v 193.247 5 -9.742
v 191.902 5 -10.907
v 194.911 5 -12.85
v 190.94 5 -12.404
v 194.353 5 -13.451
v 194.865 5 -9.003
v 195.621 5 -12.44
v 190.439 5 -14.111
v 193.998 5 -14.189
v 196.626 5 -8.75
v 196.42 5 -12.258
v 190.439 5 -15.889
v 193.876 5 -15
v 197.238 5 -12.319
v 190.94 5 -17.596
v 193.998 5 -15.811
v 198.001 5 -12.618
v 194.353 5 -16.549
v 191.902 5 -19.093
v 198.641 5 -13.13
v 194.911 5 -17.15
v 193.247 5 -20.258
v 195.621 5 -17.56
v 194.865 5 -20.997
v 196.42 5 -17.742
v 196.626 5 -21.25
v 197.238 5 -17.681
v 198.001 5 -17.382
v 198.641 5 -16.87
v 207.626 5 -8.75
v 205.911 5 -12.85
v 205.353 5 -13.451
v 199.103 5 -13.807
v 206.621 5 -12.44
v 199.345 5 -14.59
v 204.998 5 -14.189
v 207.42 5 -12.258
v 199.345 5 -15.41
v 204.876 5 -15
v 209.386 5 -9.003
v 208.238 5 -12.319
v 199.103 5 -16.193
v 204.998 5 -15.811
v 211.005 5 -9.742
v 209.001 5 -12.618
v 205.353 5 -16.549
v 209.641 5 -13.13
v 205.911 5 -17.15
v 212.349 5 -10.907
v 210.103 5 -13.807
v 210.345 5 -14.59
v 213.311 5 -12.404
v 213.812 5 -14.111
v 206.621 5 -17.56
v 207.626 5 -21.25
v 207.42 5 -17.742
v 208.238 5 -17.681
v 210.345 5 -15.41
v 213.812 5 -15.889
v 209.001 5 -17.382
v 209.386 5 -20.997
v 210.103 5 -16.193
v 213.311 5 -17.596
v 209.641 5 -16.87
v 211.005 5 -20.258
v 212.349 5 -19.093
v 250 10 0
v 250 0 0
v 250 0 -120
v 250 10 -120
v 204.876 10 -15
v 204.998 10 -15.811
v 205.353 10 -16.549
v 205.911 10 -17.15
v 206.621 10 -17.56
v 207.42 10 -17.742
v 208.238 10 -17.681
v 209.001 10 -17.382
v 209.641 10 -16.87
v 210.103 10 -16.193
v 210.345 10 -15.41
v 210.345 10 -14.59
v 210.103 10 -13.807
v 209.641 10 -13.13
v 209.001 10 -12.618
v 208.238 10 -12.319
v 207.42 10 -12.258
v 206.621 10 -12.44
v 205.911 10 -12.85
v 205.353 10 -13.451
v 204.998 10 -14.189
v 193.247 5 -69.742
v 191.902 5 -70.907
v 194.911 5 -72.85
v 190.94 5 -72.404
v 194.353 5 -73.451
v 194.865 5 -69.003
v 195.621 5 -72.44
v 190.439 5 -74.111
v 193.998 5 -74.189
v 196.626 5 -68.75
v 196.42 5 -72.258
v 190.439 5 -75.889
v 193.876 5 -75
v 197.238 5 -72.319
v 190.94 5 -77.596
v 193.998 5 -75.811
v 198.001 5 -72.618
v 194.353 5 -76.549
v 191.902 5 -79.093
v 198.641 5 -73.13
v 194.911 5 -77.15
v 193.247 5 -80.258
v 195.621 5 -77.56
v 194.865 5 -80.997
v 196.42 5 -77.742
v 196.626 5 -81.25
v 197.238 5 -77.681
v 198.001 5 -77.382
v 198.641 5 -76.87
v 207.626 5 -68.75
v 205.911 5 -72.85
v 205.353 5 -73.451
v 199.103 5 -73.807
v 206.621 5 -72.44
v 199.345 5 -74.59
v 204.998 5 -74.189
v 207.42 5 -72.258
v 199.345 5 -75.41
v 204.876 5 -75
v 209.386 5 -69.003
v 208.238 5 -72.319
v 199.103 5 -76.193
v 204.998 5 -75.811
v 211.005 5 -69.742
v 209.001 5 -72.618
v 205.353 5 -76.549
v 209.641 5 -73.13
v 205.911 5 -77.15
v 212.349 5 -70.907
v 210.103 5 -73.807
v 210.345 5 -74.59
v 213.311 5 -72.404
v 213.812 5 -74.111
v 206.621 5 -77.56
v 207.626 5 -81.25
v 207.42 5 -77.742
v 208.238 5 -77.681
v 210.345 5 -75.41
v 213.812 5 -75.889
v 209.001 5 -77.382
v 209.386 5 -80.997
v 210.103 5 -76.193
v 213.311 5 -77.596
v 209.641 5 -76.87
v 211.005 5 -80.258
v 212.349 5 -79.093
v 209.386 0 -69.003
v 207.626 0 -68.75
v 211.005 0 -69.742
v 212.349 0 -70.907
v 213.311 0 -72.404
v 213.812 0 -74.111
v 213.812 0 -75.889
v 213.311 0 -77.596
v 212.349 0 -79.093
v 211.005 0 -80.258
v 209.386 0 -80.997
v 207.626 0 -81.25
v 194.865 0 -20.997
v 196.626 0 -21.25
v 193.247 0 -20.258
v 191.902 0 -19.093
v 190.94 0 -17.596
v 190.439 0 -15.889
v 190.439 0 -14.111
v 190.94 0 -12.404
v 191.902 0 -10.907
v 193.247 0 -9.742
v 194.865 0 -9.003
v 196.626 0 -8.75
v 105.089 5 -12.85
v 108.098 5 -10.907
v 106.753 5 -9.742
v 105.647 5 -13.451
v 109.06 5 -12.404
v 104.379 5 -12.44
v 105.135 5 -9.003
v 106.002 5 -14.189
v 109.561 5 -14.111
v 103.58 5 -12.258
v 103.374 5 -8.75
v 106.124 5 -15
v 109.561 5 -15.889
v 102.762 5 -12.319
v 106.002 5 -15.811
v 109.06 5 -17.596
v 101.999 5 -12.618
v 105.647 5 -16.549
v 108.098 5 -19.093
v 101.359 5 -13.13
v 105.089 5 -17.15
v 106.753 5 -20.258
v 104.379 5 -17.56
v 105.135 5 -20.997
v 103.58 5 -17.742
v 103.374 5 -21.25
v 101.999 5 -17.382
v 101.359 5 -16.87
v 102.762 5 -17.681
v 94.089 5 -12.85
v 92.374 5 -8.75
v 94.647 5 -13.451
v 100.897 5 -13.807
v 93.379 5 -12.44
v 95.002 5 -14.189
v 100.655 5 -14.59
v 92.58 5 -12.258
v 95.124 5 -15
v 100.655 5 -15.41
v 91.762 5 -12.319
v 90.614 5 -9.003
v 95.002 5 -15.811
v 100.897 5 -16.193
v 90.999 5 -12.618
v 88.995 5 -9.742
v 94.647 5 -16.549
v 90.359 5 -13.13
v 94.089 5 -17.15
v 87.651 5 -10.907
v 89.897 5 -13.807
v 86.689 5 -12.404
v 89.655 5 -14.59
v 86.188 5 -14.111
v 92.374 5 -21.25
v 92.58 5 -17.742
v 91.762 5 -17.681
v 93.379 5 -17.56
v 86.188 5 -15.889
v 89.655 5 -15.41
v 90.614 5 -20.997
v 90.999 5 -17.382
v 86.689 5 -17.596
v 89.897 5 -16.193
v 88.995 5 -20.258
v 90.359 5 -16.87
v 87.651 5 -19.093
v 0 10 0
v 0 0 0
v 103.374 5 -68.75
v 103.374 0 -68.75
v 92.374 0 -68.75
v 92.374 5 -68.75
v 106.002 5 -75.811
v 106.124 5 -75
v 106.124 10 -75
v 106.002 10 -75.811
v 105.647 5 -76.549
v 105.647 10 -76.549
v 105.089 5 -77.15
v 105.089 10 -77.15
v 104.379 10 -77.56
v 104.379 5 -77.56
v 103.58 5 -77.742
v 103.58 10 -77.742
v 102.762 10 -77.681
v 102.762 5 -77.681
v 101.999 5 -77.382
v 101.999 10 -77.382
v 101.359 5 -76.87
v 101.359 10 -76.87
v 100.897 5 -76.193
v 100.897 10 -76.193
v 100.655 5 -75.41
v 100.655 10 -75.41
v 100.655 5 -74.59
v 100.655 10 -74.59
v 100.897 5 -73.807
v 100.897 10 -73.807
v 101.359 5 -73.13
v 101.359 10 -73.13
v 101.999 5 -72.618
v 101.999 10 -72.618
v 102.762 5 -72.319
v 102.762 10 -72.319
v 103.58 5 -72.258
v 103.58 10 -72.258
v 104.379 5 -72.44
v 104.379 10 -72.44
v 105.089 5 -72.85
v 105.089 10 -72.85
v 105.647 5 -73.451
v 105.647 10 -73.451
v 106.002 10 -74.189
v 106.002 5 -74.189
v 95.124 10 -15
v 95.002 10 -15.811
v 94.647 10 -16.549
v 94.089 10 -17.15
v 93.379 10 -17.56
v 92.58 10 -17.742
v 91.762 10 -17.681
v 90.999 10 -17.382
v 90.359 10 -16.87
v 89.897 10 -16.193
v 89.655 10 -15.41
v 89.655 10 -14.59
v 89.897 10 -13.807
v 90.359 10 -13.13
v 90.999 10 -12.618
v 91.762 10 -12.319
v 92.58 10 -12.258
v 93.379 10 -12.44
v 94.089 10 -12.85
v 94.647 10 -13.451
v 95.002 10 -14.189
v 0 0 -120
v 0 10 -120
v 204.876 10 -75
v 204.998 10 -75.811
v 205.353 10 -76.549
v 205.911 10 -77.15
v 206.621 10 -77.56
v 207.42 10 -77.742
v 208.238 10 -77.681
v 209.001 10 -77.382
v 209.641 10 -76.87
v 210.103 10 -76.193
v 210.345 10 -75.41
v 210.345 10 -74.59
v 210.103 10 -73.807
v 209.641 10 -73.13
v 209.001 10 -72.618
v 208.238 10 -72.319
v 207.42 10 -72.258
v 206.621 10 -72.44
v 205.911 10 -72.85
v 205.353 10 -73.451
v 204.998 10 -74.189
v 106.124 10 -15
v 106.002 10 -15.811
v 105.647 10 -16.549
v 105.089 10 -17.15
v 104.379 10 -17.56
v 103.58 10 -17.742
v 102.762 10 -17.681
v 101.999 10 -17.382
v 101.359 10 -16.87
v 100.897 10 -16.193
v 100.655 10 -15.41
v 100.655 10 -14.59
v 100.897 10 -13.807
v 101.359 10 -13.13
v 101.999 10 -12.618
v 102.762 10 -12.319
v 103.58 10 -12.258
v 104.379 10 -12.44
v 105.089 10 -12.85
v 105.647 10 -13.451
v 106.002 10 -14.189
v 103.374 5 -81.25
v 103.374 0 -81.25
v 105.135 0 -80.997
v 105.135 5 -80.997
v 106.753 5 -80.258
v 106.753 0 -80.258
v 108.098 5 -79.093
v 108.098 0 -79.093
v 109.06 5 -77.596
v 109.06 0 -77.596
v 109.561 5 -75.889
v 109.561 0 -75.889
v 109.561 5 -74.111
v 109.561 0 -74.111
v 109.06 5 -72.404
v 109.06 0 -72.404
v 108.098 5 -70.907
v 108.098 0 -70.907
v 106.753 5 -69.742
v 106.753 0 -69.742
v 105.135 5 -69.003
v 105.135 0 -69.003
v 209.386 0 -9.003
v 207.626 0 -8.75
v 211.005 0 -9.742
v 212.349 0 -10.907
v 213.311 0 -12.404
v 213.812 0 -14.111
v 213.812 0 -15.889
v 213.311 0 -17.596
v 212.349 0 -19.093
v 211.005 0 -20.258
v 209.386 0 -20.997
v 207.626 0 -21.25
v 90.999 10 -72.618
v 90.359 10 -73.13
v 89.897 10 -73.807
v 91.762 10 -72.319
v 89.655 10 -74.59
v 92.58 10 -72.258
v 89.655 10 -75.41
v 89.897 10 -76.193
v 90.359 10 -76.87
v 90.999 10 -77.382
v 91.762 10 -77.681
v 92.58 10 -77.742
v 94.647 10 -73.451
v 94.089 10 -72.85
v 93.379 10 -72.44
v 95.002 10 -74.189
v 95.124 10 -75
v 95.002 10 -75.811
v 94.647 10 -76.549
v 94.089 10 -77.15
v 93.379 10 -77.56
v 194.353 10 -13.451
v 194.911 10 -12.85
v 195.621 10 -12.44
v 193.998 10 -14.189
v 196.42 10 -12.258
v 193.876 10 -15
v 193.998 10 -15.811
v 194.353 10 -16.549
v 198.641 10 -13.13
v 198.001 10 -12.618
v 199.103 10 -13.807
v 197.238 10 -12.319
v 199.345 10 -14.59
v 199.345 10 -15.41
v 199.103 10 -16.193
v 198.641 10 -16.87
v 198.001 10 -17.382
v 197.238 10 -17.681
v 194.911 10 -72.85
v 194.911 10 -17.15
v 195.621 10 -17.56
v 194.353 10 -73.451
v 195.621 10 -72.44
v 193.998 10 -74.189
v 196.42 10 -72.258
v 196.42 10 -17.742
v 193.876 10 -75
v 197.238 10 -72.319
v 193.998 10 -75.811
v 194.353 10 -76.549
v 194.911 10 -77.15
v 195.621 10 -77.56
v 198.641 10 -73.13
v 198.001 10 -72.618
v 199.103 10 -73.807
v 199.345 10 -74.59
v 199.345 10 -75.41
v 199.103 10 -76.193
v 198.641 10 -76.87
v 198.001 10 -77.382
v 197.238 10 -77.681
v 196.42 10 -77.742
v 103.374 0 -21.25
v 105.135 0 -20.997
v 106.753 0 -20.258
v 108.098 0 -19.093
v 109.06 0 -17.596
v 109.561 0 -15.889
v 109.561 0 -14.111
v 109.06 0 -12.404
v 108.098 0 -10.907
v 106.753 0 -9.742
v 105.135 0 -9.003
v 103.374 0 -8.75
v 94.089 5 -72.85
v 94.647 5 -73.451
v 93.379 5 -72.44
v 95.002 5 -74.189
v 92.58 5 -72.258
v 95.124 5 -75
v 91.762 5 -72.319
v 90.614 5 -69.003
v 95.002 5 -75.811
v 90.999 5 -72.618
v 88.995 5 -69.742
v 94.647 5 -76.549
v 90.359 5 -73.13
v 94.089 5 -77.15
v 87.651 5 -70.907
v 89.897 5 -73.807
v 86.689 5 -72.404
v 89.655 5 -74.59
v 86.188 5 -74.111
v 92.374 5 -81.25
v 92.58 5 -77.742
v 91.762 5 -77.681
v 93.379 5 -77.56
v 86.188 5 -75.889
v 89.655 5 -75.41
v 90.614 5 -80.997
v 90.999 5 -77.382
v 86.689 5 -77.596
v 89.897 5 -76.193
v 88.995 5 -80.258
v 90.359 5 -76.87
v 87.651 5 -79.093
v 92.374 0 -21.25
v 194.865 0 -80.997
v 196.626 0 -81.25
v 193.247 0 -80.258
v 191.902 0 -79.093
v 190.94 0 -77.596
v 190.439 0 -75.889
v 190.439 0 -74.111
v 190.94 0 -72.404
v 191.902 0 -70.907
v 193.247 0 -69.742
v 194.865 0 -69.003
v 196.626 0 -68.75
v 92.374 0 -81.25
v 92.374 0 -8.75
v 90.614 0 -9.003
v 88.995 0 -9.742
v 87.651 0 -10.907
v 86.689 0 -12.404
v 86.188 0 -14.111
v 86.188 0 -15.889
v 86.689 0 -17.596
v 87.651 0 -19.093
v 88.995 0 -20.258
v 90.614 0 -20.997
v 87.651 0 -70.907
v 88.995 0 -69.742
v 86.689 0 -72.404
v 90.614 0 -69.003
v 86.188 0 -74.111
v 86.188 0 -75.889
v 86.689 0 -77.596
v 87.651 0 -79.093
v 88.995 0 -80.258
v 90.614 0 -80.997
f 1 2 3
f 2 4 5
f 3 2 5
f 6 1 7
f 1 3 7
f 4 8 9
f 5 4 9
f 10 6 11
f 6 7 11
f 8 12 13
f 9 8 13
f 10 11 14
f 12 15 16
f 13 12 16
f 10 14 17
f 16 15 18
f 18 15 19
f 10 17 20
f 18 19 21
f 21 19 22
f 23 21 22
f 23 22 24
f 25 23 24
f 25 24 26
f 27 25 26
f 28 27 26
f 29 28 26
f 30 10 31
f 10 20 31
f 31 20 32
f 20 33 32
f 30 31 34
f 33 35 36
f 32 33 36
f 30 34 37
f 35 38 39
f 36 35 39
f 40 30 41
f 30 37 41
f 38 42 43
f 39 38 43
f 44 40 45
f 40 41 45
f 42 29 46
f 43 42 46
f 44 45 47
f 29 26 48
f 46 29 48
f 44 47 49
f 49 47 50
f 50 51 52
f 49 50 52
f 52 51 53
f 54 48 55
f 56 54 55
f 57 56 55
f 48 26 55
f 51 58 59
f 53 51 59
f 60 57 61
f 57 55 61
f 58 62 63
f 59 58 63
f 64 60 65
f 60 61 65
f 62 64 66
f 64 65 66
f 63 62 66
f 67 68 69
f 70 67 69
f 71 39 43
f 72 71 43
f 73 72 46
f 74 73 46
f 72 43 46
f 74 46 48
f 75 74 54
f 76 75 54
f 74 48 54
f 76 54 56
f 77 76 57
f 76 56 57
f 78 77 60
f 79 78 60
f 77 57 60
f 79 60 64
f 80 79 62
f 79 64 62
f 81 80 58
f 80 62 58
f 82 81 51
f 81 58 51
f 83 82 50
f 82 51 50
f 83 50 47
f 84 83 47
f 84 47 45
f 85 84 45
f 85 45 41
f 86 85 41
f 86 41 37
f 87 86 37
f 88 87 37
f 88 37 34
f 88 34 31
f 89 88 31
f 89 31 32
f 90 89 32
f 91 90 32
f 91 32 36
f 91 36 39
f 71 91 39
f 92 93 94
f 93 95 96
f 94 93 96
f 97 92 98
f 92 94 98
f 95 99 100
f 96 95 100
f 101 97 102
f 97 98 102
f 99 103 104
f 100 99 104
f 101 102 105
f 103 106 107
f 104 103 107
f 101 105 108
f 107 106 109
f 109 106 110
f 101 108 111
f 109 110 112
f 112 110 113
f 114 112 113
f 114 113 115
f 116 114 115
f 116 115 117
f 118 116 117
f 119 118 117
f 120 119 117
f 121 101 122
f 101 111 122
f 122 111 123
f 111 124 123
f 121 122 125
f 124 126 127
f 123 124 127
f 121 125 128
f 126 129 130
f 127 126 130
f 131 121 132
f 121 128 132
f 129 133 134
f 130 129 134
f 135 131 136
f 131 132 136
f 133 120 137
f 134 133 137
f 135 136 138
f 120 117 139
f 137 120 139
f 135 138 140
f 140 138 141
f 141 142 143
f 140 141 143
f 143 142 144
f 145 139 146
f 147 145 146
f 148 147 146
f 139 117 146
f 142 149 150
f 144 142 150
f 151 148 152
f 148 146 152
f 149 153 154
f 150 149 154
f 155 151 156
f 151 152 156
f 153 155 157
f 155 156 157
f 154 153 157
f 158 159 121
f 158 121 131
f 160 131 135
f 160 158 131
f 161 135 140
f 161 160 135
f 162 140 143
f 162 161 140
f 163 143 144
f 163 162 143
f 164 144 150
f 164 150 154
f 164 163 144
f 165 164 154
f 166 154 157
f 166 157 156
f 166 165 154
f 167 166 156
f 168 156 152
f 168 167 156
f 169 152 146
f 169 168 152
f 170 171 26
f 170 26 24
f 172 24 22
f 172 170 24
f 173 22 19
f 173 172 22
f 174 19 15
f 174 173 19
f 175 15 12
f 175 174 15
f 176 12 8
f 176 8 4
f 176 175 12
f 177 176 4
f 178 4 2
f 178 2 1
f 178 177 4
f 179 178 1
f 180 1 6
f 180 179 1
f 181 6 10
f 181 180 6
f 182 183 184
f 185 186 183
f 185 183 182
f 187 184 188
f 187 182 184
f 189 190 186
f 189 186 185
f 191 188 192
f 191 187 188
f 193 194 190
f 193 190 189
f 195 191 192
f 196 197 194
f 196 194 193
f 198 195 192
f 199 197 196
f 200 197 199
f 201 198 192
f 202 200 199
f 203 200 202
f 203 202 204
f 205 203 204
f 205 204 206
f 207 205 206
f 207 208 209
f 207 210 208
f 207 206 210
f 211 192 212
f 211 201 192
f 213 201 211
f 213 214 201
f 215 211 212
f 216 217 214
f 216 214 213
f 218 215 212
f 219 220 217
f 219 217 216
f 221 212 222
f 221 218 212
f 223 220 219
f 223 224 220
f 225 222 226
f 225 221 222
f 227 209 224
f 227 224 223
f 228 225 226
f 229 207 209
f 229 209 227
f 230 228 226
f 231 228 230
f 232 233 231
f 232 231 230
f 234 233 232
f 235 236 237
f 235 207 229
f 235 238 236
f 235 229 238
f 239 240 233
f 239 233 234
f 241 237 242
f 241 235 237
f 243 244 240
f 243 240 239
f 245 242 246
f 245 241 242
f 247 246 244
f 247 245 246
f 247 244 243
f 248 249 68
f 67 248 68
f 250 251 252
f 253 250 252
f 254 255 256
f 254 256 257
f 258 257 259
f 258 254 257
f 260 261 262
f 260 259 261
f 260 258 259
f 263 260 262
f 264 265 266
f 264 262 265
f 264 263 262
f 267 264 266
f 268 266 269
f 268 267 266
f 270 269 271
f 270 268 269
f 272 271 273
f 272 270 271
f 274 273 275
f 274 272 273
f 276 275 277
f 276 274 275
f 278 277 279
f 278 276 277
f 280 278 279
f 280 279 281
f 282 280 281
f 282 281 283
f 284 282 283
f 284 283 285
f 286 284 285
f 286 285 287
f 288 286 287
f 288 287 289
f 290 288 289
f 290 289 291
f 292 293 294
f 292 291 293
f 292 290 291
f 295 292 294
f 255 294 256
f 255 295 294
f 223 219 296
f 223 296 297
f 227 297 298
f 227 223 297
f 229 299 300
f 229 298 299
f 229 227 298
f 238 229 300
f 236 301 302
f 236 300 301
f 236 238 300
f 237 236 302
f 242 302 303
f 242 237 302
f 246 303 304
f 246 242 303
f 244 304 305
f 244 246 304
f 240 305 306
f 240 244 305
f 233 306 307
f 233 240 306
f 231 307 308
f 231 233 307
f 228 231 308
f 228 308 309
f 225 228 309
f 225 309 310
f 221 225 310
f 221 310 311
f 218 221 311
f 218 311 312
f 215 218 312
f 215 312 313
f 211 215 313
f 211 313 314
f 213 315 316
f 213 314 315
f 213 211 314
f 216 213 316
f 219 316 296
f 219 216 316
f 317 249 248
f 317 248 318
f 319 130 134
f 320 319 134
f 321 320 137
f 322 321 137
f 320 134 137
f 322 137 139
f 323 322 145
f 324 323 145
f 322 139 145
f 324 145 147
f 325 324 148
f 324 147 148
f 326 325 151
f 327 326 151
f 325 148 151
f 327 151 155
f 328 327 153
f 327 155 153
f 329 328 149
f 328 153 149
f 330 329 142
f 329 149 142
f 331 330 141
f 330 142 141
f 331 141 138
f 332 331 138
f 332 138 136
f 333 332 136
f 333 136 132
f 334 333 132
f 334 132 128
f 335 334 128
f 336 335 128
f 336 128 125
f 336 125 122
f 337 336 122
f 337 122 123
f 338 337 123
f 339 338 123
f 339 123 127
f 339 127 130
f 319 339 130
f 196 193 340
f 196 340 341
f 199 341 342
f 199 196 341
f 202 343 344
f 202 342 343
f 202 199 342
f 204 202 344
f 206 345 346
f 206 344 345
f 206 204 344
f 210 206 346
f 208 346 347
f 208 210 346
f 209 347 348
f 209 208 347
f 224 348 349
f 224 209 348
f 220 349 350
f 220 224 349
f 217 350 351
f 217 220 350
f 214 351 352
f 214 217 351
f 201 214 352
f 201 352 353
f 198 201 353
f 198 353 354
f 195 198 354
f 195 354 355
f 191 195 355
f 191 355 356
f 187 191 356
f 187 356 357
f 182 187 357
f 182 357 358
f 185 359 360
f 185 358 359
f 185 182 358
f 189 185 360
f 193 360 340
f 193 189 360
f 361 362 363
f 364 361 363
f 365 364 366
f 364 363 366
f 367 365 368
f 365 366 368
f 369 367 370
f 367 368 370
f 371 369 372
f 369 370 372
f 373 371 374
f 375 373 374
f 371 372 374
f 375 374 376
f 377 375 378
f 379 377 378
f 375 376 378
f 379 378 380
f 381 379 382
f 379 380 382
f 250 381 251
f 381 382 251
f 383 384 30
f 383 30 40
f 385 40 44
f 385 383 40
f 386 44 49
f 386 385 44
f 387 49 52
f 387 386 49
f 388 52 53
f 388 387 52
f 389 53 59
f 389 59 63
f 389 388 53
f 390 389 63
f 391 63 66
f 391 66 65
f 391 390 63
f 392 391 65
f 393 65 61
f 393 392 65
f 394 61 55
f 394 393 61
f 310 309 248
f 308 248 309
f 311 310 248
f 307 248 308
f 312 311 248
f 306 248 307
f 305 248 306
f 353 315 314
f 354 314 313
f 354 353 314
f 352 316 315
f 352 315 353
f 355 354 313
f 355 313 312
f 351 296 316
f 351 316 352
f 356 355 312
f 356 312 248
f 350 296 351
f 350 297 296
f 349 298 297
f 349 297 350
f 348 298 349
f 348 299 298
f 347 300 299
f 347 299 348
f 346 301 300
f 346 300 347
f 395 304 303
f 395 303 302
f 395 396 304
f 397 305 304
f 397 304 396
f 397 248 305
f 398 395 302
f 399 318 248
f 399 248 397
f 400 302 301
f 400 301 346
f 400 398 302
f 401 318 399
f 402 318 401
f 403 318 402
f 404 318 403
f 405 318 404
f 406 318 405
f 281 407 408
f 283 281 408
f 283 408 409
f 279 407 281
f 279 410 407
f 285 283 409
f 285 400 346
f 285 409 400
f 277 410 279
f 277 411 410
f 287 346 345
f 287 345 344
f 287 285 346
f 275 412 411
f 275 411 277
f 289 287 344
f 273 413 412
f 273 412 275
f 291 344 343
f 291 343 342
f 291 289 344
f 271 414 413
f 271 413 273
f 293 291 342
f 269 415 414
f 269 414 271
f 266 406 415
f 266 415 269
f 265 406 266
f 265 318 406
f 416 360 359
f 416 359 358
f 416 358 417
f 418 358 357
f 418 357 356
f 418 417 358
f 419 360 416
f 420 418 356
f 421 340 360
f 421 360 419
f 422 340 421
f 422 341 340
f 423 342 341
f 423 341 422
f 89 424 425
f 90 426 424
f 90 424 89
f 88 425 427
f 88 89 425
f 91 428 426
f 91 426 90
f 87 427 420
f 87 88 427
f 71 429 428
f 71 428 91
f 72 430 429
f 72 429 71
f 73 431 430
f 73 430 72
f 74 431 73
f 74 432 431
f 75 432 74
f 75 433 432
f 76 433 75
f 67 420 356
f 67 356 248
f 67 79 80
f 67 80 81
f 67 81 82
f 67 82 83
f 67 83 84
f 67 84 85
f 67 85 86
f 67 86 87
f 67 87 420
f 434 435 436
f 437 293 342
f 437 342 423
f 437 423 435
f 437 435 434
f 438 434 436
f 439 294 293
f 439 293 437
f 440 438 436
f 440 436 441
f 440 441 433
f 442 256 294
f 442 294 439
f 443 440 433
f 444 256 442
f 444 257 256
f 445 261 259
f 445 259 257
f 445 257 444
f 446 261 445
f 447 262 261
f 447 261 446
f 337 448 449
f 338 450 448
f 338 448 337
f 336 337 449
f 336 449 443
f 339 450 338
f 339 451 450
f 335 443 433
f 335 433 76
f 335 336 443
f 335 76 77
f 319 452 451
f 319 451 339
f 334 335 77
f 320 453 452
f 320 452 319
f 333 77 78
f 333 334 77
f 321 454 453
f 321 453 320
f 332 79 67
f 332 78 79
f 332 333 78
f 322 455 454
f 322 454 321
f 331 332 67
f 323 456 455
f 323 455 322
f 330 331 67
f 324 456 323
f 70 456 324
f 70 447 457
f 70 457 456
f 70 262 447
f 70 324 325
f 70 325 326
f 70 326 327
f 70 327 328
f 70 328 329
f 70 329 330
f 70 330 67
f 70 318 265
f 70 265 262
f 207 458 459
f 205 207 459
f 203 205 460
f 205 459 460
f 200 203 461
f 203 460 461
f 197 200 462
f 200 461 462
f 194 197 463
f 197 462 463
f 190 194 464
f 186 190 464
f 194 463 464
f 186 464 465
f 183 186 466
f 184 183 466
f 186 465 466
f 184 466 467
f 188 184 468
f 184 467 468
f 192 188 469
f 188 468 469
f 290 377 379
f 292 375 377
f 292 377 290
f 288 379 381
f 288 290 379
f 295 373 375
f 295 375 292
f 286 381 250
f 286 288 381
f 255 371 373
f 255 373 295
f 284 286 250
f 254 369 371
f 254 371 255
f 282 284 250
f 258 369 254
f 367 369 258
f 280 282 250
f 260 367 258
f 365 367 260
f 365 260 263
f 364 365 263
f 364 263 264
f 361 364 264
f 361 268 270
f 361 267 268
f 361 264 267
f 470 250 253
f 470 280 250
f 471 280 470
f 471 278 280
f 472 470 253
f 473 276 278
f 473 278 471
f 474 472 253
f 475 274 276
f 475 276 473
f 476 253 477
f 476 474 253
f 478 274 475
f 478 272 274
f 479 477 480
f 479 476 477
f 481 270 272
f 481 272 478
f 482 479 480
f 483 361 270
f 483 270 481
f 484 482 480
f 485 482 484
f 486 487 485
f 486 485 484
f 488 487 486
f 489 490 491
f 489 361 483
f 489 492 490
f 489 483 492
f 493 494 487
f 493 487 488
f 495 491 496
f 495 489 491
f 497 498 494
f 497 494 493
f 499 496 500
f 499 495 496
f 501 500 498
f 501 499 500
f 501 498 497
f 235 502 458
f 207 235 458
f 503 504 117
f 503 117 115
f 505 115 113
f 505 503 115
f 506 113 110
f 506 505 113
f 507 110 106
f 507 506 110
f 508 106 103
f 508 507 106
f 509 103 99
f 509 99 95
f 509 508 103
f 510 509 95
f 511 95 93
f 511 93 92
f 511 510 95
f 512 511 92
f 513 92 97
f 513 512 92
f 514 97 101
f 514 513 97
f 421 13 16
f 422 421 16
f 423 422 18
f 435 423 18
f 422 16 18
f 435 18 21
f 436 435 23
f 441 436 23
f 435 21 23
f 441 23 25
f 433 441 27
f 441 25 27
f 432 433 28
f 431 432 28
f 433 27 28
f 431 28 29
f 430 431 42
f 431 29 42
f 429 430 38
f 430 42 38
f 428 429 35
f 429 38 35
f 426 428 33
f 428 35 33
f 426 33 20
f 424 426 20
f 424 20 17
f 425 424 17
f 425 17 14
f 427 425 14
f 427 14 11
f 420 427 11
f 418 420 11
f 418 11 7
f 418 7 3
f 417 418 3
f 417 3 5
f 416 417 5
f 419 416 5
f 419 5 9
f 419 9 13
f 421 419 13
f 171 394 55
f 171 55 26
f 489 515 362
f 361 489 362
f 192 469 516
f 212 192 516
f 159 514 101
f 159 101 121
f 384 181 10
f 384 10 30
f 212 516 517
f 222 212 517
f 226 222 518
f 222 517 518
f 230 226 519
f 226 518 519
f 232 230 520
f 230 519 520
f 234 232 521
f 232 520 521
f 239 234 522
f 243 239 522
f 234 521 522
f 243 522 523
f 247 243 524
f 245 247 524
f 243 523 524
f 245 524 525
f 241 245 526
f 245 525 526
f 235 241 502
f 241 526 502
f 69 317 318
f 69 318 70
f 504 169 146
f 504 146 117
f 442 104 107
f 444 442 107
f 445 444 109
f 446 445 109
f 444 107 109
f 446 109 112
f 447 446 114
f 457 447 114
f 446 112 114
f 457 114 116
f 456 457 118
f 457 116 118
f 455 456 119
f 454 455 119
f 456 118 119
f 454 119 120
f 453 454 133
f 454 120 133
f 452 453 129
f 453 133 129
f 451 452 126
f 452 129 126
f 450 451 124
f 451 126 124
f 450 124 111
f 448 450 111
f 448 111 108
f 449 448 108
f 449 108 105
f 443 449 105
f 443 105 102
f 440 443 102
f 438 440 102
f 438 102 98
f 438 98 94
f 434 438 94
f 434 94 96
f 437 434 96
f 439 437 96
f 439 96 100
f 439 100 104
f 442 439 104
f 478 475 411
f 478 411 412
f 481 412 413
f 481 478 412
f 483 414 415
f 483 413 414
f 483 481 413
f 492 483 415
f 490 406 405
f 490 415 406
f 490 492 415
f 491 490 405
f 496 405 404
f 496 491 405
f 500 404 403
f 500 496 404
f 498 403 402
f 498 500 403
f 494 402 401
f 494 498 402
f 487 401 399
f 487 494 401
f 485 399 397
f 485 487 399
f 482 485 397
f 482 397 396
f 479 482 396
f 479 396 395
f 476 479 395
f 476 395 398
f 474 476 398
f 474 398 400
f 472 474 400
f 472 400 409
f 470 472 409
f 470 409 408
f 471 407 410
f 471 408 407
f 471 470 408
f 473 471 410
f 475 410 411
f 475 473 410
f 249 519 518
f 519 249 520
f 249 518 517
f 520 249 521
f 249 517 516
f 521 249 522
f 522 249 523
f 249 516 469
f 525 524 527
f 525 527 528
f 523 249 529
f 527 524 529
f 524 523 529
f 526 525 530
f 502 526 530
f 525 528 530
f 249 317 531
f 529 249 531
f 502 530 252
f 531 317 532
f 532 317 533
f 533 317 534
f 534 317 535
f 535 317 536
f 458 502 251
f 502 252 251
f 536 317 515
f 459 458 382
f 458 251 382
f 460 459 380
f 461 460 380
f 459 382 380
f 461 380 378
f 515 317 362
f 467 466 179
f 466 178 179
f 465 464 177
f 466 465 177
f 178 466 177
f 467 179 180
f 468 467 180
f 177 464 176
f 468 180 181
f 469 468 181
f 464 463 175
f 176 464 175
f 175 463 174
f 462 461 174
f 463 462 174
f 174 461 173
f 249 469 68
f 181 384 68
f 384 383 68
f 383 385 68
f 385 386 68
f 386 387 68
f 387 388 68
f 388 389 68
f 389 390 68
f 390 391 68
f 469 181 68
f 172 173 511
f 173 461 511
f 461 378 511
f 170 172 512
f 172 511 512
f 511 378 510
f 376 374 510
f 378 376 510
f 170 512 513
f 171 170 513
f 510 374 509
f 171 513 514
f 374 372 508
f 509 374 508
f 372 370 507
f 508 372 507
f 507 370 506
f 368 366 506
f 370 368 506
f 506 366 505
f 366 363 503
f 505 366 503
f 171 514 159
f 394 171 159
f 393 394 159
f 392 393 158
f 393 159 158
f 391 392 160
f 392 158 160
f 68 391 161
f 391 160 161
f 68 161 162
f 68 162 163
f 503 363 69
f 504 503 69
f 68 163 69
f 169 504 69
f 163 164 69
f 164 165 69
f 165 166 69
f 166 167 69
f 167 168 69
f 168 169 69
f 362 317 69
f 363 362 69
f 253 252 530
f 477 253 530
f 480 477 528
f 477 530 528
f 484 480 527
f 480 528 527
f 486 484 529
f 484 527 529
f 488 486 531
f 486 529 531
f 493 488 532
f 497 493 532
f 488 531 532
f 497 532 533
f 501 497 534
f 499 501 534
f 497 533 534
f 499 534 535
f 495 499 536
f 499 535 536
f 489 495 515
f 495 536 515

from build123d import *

# Parameters (mm, degrees)
SKETCH1_W            = 250
SKETCH1_H            = 120
BOSS_EXTRUDE1_DEPTH  = 10
M5_CLEARANCE_HOLE1_D = 5.5
CUT_EXTRUDE1_DEPTH   = 5


with BuildPart() as part:
    # Sketch1 → Boss-Extrude1 (new body)
    with BuildSketch(Plane(origin=(0, 0, 0), x_dir=(1, 0, 0), z_dir=(0, 1, 0))):
        with Locations((125, 60)):
            Rectangle(SKETCH1_W, SKETCH1_H)
    extrude(amount=BOSS_EXTRUDE1_DEPTH)

    # M5 Clearance Hole1 (through all)
    with Locations(Plane(origin=(0, 10, 0), x_dir=(1, 0, 0), z_dir=(0, 1, 0))):
        with Locations((196.625581146, 15), (207.625581146, 15), (207.625581146, 75), (196.625581146, 75)):
            m5_clearance_hole1 = Hole(M5_CLEARANCE_HOLE1_D / 2)

    # Sketch5 → Cut-Extrude1 (cut)
    with BuildSketch(Plane(origin=(0, 0, 0), x_dir=(-1, 0, 0), z_dir=(0, -1, 0))):
        with BuildLine():
            Line((-196.625581146, 8.75), (-207.625581146, 8.75))
            ThreePointArc((-207.625581146, 8.75), (-213.875581146, 15), (-207.625581146, 21.25))
            Line((-207.625581146, 21.25), (-196.625581146, 21.25))
            ThreePointArc((-196.625581146, 21.25), (-190.375581146, 15), (-196.625581146, 8.75))
        make_face()
        with BuildLine():
            Line((-196.625581146, 68.75), (-207.625581146, 68.75))
            ThreePointArc((-207.625581146, 68.75), (-213.875581146, 75), (-207.625581146, 81.25))
            Line((-207.625581146, 81.25), (-196.625581146, 81.25))
            ThreePointArc((-196.625581146, 81.25), (-190.375581146, 75), (-196.625581146, 68.75))
        make_face()
    cut_extrude1 = extrude(amount=-CUT_EXTRUDE1_DEPTH, mode=Mode.SUBTRACT)

    # Mirror1: M5 Clearance Hole1, Cut-Extrude1 across plane
    add(m5_clearance_hole1.mirror(Plane(origin=(150, 0, 0), x_dir=(0, 0, 1), z_dir=(1, 0, 0))), mode=Mode.SUBTRACT)
    add(cut_extrude1.mirror(Plane(origin=(150, 0, 0), x_dir=(0, 0, 1), z_dir=(1, 0, 0))), mode=Mode.SUBTRACT)


solid = part.part
